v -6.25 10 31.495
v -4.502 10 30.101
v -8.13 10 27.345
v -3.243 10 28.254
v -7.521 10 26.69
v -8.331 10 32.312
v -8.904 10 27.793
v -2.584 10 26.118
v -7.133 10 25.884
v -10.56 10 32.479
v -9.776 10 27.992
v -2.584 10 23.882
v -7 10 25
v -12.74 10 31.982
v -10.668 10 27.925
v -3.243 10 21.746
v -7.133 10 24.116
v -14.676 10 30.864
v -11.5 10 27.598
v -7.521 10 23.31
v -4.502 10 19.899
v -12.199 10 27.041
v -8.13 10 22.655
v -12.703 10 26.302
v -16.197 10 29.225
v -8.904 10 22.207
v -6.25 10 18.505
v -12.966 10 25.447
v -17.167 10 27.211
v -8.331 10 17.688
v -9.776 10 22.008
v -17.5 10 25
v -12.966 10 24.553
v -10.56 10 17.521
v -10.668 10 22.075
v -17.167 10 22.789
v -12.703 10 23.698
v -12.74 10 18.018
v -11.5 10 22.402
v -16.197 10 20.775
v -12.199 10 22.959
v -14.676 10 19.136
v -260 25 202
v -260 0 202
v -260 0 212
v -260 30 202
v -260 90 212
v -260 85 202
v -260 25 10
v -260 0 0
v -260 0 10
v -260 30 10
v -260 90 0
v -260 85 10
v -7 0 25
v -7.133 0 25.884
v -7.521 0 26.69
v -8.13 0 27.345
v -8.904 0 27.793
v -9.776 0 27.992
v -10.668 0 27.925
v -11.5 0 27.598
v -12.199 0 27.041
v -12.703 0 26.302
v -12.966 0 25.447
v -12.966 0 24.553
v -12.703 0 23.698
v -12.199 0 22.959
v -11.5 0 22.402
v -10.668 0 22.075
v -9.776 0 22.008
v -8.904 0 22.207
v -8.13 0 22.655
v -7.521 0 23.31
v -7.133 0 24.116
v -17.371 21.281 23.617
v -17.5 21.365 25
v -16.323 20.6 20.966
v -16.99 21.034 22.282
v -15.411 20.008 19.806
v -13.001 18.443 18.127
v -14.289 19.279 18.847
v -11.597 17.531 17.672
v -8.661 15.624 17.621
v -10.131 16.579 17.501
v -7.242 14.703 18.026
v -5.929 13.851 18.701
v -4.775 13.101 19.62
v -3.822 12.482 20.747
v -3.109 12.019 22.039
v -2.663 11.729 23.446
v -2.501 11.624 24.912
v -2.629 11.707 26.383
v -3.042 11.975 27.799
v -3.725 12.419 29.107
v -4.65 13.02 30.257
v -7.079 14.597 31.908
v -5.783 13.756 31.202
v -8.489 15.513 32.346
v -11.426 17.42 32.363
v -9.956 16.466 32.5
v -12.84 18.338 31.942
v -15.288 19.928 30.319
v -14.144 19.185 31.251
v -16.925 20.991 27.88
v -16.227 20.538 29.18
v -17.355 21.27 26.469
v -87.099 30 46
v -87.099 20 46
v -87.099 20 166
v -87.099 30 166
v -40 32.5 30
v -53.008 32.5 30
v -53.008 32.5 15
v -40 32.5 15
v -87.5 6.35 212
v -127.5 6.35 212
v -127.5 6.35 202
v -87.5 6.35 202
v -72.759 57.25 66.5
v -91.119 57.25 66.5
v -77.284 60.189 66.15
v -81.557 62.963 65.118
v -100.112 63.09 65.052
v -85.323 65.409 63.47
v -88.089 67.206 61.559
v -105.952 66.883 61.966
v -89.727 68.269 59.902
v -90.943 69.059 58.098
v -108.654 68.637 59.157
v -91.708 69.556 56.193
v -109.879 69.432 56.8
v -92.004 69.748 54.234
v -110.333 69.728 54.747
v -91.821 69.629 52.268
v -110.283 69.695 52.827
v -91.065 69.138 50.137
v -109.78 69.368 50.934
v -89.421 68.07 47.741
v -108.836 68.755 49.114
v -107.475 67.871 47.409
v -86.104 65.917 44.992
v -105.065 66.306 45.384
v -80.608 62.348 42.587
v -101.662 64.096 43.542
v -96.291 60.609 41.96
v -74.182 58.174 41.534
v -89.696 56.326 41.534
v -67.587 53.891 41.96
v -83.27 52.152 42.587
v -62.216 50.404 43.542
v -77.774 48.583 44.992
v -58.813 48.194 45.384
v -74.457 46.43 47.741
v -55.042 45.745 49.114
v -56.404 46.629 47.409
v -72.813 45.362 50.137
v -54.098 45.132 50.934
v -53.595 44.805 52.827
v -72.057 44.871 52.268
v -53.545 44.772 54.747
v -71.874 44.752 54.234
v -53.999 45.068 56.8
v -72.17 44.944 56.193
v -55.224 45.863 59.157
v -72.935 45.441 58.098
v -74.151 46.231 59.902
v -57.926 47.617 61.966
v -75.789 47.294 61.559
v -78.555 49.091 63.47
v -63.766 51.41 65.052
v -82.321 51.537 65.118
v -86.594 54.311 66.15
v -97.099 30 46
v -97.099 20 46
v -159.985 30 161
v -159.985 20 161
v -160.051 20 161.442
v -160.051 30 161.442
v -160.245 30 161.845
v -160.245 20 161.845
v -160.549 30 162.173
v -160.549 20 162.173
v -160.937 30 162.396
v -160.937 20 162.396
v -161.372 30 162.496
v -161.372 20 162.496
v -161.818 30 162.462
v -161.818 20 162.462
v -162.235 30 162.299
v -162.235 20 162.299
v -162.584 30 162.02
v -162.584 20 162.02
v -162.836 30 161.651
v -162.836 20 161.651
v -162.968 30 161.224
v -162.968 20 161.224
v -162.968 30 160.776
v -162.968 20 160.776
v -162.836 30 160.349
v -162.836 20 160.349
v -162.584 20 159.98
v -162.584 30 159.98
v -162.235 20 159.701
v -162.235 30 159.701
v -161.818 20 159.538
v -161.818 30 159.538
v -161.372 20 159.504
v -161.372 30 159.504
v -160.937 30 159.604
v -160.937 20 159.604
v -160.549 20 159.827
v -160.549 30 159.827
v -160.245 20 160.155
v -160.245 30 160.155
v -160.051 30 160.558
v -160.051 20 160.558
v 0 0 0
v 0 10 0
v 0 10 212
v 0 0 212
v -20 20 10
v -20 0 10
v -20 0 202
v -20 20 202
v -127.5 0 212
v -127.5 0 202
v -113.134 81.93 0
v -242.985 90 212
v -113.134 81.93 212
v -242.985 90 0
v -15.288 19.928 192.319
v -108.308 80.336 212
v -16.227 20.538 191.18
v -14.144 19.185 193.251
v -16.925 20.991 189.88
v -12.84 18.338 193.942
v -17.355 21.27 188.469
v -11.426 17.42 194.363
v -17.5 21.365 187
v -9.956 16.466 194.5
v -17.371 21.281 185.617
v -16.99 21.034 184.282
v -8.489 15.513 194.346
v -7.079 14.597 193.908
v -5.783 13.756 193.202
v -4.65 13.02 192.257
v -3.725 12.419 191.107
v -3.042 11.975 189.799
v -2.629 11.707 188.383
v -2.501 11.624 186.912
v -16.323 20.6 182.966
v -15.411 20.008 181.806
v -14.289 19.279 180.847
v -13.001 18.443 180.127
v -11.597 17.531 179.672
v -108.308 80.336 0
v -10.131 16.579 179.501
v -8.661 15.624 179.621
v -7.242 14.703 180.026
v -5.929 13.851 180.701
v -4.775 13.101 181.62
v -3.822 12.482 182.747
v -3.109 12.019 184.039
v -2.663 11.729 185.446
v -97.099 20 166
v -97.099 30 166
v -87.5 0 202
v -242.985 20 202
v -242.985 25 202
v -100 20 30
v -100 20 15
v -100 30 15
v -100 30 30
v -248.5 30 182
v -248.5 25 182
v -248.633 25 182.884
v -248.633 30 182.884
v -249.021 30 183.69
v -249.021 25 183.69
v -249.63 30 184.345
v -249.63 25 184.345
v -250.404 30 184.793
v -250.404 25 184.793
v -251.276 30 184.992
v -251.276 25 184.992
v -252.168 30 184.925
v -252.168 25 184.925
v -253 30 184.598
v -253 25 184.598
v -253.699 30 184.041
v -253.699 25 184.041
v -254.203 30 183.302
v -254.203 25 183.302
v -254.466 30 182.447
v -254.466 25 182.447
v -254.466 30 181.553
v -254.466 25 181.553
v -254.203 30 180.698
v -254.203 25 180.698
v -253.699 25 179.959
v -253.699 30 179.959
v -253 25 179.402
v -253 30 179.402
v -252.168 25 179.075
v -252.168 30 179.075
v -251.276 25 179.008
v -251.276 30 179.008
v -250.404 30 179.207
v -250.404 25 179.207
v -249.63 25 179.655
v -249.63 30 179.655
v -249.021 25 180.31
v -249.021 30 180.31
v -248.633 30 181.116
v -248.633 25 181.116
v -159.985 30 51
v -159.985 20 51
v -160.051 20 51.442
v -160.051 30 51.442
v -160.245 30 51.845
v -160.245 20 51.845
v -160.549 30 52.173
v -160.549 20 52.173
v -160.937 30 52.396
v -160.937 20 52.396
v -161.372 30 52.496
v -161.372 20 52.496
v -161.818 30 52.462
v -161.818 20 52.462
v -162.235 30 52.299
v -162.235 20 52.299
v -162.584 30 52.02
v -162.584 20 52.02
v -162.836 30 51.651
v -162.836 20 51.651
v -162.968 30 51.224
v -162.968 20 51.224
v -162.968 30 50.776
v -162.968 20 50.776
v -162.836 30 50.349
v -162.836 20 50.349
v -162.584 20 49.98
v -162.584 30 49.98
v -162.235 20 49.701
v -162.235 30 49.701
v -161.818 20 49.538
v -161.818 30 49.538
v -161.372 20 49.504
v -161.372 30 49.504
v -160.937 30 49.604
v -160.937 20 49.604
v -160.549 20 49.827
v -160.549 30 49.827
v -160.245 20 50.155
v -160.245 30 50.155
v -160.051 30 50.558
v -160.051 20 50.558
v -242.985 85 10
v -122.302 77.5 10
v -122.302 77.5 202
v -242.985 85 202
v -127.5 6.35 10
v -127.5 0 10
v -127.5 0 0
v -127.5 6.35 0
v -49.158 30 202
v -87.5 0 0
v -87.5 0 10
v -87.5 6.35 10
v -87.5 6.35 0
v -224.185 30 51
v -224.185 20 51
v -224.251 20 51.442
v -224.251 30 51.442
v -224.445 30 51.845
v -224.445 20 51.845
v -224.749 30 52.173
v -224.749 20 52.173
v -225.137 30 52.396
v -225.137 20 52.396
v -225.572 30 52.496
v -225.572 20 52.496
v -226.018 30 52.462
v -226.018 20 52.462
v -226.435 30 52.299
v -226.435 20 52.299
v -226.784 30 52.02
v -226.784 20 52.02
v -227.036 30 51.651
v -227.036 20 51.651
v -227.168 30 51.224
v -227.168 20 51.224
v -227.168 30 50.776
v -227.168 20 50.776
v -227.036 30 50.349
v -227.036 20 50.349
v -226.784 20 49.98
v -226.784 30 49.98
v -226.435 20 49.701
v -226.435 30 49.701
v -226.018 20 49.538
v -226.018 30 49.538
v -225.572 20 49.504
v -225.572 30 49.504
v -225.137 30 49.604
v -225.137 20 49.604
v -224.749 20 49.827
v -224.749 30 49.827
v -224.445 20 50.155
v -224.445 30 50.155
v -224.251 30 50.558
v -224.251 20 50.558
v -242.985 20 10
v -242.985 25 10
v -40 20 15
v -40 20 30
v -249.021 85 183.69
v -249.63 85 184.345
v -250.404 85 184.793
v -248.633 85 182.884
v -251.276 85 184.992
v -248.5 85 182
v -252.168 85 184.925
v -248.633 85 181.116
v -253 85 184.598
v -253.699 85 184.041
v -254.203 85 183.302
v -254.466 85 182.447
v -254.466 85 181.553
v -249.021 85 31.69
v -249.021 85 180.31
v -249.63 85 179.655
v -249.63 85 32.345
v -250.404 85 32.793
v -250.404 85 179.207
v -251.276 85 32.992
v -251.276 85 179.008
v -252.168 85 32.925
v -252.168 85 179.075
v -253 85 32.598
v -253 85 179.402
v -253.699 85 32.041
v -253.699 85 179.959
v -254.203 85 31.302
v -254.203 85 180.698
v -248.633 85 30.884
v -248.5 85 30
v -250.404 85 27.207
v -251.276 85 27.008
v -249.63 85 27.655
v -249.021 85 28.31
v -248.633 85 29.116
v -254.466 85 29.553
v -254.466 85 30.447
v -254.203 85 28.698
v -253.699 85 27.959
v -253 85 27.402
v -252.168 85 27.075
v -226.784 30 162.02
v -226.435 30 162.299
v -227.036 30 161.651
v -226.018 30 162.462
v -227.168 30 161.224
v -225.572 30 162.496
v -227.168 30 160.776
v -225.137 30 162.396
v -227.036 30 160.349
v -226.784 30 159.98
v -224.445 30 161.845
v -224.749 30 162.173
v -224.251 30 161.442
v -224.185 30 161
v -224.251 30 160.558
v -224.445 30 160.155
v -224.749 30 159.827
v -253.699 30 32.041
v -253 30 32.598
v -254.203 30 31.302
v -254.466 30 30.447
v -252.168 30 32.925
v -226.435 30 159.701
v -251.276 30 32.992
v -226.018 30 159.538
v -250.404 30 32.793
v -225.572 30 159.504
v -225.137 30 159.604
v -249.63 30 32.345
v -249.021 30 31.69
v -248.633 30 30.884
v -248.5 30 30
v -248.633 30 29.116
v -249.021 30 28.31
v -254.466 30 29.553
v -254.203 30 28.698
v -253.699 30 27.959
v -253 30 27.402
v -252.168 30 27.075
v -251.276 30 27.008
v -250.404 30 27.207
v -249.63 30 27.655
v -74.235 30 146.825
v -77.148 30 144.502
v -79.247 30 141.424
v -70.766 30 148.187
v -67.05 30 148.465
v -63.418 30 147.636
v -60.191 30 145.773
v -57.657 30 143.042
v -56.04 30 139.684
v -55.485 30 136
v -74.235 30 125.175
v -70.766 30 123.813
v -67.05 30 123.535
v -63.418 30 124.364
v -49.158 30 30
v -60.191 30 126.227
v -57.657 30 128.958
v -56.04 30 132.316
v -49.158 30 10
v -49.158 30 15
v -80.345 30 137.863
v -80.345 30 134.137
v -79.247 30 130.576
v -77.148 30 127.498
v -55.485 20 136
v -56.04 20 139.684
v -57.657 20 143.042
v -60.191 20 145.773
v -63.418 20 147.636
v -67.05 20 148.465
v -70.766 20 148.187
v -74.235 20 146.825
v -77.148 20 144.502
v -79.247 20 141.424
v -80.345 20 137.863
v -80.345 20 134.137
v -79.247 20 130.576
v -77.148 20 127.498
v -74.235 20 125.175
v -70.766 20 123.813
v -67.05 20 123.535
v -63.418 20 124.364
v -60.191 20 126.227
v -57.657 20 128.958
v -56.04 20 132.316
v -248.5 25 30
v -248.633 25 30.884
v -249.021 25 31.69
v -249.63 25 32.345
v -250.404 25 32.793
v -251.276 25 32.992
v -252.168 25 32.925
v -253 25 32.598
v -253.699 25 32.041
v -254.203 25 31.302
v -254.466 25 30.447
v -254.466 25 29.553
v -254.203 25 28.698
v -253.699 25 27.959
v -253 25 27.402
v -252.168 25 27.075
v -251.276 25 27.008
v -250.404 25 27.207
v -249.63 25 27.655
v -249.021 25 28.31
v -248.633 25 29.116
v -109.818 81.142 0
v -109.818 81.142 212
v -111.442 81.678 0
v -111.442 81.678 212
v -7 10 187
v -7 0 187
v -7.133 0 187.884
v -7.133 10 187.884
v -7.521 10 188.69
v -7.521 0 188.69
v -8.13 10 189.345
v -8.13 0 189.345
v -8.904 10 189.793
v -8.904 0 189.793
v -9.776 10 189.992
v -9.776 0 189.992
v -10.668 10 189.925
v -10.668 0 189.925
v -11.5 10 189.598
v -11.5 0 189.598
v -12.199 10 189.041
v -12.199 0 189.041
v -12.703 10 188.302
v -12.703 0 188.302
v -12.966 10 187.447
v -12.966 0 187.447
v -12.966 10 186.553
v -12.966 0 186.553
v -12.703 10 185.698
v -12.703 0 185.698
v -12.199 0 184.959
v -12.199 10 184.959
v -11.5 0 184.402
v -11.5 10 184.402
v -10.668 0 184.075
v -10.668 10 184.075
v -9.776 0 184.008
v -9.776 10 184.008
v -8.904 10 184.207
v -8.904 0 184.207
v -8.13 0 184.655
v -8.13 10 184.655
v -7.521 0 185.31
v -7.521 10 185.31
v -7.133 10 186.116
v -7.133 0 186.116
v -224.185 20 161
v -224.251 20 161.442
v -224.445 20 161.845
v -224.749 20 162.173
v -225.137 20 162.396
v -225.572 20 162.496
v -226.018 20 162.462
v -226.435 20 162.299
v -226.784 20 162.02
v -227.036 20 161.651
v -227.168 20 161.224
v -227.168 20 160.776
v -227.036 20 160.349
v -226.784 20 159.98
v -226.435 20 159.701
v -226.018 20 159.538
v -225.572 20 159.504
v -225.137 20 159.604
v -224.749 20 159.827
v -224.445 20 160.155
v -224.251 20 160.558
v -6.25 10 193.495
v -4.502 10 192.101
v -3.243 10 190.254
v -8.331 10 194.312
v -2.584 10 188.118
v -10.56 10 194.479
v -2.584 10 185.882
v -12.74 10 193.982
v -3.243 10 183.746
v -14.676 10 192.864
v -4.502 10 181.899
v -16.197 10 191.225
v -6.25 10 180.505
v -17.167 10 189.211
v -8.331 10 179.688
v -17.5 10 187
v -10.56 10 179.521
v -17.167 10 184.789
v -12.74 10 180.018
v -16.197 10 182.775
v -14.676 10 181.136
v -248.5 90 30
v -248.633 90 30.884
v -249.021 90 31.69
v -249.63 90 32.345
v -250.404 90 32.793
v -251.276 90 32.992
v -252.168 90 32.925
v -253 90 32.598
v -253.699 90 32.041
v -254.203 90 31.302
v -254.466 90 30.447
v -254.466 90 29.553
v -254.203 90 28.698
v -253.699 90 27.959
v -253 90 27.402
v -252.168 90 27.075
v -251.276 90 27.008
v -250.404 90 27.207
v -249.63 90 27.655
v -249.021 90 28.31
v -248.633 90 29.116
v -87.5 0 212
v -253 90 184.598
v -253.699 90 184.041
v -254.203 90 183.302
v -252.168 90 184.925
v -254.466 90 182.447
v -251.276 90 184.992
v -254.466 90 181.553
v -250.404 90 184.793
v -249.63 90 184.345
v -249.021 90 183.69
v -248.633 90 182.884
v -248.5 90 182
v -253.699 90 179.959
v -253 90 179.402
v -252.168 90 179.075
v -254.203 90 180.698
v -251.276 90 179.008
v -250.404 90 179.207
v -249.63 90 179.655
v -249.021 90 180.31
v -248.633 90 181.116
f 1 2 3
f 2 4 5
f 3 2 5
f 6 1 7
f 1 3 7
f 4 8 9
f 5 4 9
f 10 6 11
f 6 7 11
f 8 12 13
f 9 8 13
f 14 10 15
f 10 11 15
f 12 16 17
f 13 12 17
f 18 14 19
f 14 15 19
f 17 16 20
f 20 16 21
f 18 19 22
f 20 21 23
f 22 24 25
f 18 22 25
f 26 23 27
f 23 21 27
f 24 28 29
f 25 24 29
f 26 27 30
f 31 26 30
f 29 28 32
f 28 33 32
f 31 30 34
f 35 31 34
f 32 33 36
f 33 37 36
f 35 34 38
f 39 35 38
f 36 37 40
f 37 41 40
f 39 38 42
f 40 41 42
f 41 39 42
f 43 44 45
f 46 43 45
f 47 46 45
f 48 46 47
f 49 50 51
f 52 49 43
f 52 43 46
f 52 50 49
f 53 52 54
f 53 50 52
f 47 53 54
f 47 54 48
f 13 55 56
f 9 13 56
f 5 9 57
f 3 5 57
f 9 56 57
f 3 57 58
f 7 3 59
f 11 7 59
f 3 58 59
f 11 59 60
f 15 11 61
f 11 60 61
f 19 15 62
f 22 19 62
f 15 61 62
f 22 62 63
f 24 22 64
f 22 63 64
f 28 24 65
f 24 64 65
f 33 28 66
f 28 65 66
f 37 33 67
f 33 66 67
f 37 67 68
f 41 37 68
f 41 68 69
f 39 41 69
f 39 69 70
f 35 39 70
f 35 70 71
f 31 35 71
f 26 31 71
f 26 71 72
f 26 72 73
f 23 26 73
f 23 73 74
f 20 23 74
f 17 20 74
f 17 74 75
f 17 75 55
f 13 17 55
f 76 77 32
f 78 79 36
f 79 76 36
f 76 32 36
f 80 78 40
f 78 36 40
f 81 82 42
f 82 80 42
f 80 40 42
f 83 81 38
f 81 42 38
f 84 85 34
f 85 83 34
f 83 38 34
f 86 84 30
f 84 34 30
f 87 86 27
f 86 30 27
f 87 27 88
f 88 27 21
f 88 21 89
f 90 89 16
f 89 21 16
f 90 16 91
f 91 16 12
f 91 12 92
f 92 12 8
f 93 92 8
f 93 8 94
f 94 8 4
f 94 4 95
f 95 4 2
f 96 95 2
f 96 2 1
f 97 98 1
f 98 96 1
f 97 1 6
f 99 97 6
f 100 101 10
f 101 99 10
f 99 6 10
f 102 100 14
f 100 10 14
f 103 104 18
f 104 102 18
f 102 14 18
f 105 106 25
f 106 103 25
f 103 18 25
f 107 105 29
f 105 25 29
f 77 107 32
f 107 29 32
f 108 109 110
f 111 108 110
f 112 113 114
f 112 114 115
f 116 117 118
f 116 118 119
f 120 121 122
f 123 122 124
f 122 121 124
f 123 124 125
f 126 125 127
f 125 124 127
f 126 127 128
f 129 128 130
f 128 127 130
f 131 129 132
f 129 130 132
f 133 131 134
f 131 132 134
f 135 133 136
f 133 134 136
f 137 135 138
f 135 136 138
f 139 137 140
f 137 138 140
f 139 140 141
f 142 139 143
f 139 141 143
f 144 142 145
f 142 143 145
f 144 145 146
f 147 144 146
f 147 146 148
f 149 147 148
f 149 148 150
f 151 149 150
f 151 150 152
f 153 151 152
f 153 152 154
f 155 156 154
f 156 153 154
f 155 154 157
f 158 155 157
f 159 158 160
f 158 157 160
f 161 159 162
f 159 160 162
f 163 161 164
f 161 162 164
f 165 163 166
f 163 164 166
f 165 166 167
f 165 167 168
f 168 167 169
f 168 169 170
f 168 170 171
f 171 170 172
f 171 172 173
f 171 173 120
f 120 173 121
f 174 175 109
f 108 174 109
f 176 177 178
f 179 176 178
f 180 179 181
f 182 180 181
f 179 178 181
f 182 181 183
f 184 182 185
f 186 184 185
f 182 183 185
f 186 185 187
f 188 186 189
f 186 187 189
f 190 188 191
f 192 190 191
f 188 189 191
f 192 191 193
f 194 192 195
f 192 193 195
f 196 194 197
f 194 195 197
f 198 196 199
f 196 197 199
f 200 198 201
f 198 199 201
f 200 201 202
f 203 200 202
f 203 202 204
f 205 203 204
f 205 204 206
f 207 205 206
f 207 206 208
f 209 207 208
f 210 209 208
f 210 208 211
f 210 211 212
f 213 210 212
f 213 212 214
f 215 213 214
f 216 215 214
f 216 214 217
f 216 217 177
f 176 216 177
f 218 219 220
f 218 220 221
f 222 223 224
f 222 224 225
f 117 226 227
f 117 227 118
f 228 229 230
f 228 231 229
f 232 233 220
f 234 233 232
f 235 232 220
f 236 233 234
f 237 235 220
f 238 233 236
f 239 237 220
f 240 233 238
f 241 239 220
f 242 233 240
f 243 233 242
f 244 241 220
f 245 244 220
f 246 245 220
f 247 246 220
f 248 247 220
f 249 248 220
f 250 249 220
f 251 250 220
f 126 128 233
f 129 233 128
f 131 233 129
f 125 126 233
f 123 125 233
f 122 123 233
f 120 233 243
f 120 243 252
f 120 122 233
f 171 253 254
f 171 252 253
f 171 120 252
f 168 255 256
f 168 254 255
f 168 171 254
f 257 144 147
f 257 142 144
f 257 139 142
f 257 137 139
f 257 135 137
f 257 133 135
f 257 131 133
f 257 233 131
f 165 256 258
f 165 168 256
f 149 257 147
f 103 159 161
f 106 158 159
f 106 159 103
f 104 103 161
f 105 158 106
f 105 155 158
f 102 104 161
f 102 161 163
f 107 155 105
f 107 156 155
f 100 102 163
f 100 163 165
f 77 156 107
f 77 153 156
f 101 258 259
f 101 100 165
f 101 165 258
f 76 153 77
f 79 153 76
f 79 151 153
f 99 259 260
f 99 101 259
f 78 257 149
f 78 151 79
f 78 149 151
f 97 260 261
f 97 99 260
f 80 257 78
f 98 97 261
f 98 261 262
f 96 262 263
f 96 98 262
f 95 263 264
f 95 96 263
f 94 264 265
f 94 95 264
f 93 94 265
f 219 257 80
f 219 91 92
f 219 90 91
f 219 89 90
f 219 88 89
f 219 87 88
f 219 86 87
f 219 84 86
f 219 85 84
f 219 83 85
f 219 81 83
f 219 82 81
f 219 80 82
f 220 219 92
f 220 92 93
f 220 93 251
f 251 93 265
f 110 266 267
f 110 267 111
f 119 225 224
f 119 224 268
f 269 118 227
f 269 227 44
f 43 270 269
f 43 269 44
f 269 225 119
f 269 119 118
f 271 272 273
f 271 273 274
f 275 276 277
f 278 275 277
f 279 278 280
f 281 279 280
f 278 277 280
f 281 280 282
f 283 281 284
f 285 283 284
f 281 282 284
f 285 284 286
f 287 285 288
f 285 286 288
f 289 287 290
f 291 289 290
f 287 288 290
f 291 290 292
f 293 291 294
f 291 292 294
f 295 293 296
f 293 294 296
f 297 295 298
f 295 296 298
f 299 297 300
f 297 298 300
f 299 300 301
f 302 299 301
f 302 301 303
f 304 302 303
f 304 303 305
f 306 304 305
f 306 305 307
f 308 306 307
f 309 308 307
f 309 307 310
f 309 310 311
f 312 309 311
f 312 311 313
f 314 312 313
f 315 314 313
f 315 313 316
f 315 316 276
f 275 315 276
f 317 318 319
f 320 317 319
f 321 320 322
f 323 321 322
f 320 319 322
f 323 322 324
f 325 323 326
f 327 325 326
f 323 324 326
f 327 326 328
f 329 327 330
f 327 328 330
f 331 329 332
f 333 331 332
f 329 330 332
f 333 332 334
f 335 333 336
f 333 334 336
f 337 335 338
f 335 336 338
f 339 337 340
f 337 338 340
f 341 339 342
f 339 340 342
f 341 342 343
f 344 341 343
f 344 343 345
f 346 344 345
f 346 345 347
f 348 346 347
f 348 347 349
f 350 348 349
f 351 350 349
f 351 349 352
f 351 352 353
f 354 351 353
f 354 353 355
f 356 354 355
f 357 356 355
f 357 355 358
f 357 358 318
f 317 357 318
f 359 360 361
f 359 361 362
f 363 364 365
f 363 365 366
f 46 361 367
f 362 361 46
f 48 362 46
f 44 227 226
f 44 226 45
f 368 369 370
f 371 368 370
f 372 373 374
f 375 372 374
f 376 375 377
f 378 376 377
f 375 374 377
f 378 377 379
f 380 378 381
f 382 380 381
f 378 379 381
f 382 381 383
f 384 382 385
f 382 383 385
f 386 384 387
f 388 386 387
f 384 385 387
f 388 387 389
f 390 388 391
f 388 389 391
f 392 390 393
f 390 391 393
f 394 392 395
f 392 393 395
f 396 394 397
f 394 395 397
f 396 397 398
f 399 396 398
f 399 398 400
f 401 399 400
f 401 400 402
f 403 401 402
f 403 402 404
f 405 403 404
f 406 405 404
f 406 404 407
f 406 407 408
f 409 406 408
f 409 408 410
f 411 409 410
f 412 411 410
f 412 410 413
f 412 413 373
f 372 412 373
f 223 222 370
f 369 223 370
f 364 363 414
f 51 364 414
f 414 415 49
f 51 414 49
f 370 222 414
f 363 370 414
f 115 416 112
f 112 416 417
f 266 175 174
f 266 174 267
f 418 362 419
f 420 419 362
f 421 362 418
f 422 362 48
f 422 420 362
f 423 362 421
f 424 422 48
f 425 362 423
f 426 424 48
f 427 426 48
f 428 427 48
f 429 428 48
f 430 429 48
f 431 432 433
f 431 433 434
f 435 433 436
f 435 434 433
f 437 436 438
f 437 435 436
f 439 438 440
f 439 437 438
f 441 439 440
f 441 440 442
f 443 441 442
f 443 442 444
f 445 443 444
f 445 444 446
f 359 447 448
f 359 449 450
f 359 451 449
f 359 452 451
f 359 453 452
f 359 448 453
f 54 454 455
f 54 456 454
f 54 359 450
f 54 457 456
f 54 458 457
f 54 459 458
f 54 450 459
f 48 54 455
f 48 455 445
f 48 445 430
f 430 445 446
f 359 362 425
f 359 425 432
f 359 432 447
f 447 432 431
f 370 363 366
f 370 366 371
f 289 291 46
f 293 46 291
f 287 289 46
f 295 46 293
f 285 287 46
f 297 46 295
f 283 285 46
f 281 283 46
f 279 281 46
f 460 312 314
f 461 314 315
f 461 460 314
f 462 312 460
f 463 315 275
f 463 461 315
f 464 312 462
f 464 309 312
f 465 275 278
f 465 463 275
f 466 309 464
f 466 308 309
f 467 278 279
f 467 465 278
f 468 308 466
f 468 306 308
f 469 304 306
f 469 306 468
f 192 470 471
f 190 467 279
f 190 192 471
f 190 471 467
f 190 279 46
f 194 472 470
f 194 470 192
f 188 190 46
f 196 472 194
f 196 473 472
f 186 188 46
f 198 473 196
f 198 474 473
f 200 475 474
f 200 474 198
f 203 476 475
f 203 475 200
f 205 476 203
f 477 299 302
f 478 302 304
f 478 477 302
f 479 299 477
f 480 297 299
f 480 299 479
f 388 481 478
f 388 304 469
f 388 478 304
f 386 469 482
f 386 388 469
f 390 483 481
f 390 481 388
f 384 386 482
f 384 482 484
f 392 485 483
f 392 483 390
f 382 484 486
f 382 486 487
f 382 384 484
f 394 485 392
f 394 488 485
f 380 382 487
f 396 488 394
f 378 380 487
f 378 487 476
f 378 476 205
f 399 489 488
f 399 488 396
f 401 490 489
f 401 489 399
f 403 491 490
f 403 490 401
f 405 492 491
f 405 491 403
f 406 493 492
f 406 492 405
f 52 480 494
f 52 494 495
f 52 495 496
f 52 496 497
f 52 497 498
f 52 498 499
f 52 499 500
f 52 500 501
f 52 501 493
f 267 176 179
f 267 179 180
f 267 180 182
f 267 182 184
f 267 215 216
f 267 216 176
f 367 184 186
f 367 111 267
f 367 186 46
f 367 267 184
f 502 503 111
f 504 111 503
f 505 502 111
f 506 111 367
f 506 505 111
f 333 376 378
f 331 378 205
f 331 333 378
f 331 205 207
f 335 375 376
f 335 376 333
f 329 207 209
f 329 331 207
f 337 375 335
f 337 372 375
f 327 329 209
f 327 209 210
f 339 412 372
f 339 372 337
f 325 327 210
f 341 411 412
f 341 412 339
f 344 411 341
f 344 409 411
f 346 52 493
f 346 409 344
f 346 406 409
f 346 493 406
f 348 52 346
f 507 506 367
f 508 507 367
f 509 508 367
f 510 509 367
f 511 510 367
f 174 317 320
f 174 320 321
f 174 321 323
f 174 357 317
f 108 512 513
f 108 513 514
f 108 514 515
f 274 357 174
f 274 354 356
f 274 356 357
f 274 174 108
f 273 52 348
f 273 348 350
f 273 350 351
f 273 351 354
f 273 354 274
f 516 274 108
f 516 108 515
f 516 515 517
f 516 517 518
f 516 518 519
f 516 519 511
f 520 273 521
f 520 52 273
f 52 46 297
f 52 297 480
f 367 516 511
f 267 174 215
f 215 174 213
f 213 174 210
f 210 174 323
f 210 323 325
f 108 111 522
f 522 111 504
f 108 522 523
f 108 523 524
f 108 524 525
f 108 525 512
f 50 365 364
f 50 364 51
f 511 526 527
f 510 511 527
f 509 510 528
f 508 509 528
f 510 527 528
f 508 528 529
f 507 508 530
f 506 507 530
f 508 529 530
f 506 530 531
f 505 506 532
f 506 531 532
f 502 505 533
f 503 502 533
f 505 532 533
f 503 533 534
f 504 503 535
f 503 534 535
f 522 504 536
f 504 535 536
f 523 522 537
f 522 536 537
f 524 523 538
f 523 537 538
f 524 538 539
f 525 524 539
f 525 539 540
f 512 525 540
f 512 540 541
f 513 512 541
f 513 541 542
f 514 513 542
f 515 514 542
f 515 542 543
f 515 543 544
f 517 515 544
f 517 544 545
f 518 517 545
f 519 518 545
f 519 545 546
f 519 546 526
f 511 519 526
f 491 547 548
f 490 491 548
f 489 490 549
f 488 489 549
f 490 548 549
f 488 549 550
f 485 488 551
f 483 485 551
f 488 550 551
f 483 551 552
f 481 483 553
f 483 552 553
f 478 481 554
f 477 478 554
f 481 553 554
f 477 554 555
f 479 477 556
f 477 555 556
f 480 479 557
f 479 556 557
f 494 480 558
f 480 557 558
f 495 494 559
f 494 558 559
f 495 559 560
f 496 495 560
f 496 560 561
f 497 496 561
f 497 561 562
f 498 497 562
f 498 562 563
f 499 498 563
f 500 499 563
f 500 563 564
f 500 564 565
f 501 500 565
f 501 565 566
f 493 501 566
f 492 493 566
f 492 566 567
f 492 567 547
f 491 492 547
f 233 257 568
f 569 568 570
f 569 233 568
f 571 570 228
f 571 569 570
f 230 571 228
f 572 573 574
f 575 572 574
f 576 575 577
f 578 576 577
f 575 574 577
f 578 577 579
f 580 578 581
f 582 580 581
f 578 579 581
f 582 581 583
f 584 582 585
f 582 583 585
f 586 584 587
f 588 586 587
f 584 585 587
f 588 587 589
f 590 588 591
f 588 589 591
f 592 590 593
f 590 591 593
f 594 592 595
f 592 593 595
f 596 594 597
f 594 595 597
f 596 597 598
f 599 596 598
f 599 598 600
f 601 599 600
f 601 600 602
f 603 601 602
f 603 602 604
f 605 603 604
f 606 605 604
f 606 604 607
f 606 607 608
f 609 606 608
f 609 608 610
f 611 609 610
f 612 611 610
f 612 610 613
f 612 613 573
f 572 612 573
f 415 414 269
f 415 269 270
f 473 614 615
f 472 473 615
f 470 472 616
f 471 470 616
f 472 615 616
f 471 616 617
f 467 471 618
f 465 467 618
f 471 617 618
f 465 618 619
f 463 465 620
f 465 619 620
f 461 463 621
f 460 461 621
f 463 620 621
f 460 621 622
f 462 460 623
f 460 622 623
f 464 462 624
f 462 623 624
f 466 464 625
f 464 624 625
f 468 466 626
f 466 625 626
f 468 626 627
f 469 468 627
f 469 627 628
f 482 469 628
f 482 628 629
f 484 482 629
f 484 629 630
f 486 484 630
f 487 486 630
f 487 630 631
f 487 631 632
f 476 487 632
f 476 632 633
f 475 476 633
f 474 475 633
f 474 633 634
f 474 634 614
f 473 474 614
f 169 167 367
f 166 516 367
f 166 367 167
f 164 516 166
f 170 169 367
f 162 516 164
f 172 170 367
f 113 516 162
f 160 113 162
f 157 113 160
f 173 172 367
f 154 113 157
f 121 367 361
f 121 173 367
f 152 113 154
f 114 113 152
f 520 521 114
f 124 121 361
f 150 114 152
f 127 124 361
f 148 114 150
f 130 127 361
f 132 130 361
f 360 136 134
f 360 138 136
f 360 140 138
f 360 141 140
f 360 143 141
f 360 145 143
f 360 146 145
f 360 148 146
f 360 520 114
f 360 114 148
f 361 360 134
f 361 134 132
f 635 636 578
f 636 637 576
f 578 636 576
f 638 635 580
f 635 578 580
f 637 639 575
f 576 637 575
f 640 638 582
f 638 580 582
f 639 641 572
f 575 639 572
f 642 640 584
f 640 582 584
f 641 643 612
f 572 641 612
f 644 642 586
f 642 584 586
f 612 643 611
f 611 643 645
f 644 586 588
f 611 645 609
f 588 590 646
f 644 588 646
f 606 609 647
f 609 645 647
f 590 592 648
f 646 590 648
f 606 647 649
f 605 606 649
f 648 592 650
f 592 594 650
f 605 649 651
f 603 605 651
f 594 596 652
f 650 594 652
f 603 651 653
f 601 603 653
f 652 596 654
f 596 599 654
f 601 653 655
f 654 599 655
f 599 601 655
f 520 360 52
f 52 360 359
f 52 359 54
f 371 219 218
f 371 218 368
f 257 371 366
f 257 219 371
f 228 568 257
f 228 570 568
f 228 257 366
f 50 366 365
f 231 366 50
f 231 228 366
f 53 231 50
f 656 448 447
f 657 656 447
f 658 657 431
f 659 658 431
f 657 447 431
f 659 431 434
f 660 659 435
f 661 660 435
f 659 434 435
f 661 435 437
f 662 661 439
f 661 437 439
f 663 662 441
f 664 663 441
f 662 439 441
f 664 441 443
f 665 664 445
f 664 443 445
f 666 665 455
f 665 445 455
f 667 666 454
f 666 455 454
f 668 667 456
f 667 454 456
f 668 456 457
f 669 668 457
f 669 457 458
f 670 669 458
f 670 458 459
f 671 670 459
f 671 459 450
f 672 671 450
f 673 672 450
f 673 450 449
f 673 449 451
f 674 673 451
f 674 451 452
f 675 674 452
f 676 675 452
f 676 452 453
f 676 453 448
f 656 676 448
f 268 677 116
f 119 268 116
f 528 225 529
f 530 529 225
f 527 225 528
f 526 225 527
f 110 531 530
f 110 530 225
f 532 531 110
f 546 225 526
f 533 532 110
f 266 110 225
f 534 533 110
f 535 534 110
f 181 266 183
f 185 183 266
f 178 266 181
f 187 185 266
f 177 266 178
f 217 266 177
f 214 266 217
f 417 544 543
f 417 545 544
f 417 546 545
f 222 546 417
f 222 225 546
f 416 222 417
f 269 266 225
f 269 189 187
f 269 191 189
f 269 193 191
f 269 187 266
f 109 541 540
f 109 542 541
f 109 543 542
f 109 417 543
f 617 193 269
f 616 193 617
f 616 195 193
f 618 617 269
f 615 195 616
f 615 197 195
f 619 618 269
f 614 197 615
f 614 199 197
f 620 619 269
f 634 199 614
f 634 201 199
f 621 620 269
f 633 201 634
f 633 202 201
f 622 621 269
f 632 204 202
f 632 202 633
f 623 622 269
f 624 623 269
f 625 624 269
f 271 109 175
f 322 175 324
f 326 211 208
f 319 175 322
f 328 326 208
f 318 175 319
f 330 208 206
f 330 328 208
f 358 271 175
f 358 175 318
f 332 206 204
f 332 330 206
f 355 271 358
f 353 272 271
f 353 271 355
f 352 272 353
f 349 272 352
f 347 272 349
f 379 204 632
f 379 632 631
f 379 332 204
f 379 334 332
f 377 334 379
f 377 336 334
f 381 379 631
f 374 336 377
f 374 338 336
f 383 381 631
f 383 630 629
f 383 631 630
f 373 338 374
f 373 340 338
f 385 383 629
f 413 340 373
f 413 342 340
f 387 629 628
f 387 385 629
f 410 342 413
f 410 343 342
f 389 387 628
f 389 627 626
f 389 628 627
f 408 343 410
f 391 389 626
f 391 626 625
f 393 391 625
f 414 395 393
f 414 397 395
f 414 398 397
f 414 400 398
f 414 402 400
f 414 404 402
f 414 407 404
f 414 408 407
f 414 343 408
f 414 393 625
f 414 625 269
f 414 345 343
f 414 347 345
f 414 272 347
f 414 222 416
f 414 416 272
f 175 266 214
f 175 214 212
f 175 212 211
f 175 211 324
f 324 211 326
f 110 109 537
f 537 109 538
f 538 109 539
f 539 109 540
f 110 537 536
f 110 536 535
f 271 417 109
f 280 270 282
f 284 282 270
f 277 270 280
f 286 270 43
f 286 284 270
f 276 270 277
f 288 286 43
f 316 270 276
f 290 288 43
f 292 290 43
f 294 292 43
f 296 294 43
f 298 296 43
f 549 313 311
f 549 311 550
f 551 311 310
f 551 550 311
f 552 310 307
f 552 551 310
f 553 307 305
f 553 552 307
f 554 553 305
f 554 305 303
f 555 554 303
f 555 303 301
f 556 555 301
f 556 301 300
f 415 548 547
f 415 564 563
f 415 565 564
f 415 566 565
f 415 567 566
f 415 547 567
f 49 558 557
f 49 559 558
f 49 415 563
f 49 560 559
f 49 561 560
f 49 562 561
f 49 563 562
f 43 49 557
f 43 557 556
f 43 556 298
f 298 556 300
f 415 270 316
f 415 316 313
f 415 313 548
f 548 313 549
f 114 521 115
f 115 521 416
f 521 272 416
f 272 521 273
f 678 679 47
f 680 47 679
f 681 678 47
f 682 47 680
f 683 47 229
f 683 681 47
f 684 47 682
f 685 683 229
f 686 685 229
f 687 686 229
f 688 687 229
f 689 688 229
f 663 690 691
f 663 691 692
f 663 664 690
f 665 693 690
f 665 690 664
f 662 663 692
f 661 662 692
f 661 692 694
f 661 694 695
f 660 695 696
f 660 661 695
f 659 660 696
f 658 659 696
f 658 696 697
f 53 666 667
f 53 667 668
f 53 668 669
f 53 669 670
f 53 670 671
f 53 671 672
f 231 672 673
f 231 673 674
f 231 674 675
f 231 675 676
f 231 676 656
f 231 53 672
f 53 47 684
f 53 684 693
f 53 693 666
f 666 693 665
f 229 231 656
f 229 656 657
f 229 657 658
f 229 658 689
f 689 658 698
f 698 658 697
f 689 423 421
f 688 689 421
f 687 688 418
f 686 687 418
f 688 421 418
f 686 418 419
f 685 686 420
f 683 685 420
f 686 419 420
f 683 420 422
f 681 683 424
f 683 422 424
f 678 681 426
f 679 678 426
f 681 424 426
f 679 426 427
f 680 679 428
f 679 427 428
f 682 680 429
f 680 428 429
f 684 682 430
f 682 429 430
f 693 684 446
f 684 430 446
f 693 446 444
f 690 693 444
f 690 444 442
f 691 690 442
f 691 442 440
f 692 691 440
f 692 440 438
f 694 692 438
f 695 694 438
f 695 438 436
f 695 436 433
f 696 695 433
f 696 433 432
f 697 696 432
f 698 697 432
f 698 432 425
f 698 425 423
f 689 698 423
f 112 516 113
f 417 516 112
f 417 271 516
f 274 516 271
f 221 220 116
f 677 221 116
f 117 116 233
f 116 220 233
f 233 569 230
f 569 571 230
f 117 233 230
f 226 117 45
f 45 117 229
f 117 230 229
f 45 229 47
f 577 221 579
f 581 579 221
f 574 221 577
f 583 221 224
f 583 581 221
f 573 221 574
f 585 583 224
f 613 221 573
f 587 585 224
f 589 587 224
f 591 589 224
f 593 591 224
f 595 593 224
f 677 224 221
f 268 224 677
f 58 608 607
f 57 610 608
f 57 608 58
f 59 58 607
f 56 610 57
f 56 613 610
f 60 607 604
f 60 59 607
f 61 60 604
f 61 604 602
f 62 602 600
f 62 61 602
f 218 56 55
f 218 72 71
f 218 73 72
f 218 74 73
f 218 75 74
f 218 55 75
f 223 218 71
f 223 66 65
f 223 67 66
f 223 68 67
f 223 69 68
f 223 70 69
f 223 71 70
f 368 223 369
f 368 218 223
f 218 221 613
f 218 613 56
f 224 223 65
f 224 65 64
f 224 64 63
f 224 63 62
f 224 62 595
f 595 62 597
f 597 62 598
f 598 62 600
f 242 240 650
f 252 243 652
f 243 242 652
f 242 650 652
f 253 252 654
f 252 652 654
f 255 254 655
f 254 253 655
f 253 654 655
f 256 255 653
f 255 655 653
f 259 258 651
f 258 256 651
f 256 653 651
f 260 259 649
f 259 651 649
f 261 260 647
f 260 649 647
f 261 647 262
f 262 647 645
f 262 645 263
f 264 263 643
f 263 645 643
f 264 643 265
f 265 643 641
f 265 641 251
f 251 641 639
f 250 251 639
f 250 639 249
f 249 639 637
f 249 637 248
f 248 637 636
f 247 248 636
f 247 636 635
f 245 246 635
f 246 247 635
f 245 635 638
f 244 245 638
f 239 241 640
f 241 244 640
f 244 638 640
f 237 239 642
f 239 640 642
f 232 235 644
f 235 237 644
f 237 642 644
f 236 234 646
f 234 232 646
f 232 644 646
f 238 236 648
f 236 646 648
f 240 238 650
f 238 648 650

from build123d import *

# Parameters (mm, degrees)
BOSS_EXTRUDE1_DEPTH     = 212
BOSS_EXTRUDE2_DEPTH     = 10
BOSS_EXTRUDE3_DEPTH     = 10
SKETCH4_R               = 3
CUT_EXTRUDE1_DEPTH      = 91
SKETCH6_R               = 7.5
CUT_EXTRUDE2_DEPTH      = 81
SKETCH7_R               = 1.5
SKETCH7_R_2             = 12.5
SKETCH7_W               = 10
SKETCH7_H               = 120
SKETCH7_W_2             = 60
SKETCH7_H_2             = 15
CUT_EXTRUDE3_DEPTH      = 12.5
CUT_EXTRUDE4_REACH      = 112.512
SKETCH8_R               = 12.5
SKETCH9_R               = 3
CUT_EXTRUDE5_DEPTH      = 26
CUT_EXTRUDE5_DEPTH_BACK = 66
SKETCH10_W              = 40
SKETCH10_H              = 6.35
CUT_EXTRUDE6_DEPTH      = 1
CUT_EXTRUDE6_DEPTH_BACK = 213
FILLET1_R               = 10


with BuildPart() as part:
    # Sketch1 → Boss-Extrude1 (new body)
    with BuildSketch(Plane.XY):
        Polygon((0, 0), (-20, 0), (-20, 20), (-242.984559153, 20), (-242.984559153, 25), (-260, 25), (-260, 30), (-49.158083864, 30), (-122.301669645, 77.5), (-242.984559153, 85), (-260, 85), (-260, 90), (-242.984559153, 90), (-110.511971445, 81.767313396), (0, 10), align=None)
    extrude(amount=BOSS_EXTRUDE1_DEPTH)

    # Sketch2 → Boss-Extrude2 (add)
    with BuildSketch(Plane(origin=(0, 0, 0), x_dir=(-1, 0, 0), z_dir=(0, 0, -1))):
        Polygon((0, 0), (260, 0), (260, 90), (110.511971445, 81.767313396), (0, 10), align=None)
    extrude(amount=-BOSS_EXTRUDE2_DEPTH)

    # Sketch3 → Boss-Extrude3 (add)
    with BuildSketch(Plane.XY.offset(212)):
        Polygon((-110.511971445, 81.767313396), (0, 10), (0, 0), (-260, 0), (-260, 90), align=None)
    extrude(amount=-BOSS_EXTRUDE3_DEPTH)

    # Sketch4 → Cut-Extrude1 (cut, through all)
    with BuildSketch(Plane.XZ):
        with Locations((-10, 187)):
            Circle(SKETCH4_R)
        with Locations((-10, 25)):
            Circle(SKETCH4_R)
    extrude(amount=-CUT_EXTRUDE1_DEPTH, mode=Mode.SUBTRACT)

    # Sketch6 → Cut-Extrude2 (cut, through all)
    with BuildSketch(Plane(origin=(0, 10, 0), x_dir=(-1, 0, 0), z_dir=(0, -1, 0))):
        with Locations((10, -25)):
            Circle(SKETCH6_R)
        with Locations((10, -187)):
            Circle(SKETCH6_R)
    extrude(amount=-CUT_EXTRUDE2_DEPTH, mode=Mode.SUBTRACT)

    # Sketch7 → Cut-Extrude3 (cut)
    with BuildSketch(Plane.XZ.offset(-20)):
        with Locations((-161.484559153, 161)):
            Circle(SKETCH7_R)
        with Locations((-225.684559153, 161)):
            Circle(SKETCH7_R)
        with Locations((-161.484559153, 51)):
            Circle(SKETCH7_R)
        with Locations((-225.684559153, 51)):
            Circle(SKETCH7_R)
        with Locations((-67.984559153, 136)):
            Circle(SKETCH7_R_2)
        with Locations((-92.099111311, 106)):
            Rectangle(SKETCH7_W, SKETCH7_H)
        with Locations((-70, 22.5)):
            Rectangle(SKETCH7_W_2, SKETCH7_H_2)
    extrude(amount=-CUT_EXTRUDE3_DEPTH, mode=Mode.SUBTRACT)

    # Sketch8 → Cut-Extrude4 (cut, up to next)
    with BuildSketch(Plane.ZY.offset(110.511971445), mode=Mode.PRIVATE) as cut_extrude4_sk1:
        with Locations((54, 57.25)):
            Circle(SKETCH8_R)
    cut_extrude4_tool1 = extrude(cut_extrude4_sk1.sketch, amount=-CUT_EXTRUDE4_REACH, mode=Mode.PRIVATE) & part.part
    add(cut_extrude4_tool1.solids().sort_by_distance((-110.511971, 57.25, 54))[0], mode=Mode.SUBTRACT)

    # Sketch9 → Cut-Extrude5 (cut, two sides)
    with BuildSketch(Plane.XZ.offset(-25)) as cut_extrude5_sk:
        with Locations((-251.5, 182)):
            Circle(SKETCH9_R)
        with Locations((-251.5, 30)):
            Circle(SKETCH9_R)
    extrude(amount=CUT_EXTRUDE5_DEPTH, mode=Mode.SUBTRACT)
    extrude(cut_extrude5_sk.sketch, amount=-CUT_EXTRUDE5_DEPTH_BACK, mode=Mode.SUBTRACT)

    # Sketch10 → Cut-Extrude6 (cut, two sides)
    with BuildSketch(Plane.XY.offset(212)) as cut_extrude6_sk:
        with Locations((-107.5, 3.175)):
            Rectangle(SKETCH10_W, SKETCH10_H)
    extrude(amount=CUT_EXTRUDE6_DEPTH, mode=Mode.SUBTRACT)
    extrude(cut_extrude6_sk.sketch, amount=-CUT_EXTRUDE6_DEPTH_BACK, mode=Mode.SUBTRACT)

    # Fillet1
    fillet1_edges = [part.edges().sort_by_distance(p)[0] for p in [
        (-110.511971445, 81.767313396, 106),
    ]]
    fillet(fillet1_edges, radius=FILLET1_R)


solid = part.part
